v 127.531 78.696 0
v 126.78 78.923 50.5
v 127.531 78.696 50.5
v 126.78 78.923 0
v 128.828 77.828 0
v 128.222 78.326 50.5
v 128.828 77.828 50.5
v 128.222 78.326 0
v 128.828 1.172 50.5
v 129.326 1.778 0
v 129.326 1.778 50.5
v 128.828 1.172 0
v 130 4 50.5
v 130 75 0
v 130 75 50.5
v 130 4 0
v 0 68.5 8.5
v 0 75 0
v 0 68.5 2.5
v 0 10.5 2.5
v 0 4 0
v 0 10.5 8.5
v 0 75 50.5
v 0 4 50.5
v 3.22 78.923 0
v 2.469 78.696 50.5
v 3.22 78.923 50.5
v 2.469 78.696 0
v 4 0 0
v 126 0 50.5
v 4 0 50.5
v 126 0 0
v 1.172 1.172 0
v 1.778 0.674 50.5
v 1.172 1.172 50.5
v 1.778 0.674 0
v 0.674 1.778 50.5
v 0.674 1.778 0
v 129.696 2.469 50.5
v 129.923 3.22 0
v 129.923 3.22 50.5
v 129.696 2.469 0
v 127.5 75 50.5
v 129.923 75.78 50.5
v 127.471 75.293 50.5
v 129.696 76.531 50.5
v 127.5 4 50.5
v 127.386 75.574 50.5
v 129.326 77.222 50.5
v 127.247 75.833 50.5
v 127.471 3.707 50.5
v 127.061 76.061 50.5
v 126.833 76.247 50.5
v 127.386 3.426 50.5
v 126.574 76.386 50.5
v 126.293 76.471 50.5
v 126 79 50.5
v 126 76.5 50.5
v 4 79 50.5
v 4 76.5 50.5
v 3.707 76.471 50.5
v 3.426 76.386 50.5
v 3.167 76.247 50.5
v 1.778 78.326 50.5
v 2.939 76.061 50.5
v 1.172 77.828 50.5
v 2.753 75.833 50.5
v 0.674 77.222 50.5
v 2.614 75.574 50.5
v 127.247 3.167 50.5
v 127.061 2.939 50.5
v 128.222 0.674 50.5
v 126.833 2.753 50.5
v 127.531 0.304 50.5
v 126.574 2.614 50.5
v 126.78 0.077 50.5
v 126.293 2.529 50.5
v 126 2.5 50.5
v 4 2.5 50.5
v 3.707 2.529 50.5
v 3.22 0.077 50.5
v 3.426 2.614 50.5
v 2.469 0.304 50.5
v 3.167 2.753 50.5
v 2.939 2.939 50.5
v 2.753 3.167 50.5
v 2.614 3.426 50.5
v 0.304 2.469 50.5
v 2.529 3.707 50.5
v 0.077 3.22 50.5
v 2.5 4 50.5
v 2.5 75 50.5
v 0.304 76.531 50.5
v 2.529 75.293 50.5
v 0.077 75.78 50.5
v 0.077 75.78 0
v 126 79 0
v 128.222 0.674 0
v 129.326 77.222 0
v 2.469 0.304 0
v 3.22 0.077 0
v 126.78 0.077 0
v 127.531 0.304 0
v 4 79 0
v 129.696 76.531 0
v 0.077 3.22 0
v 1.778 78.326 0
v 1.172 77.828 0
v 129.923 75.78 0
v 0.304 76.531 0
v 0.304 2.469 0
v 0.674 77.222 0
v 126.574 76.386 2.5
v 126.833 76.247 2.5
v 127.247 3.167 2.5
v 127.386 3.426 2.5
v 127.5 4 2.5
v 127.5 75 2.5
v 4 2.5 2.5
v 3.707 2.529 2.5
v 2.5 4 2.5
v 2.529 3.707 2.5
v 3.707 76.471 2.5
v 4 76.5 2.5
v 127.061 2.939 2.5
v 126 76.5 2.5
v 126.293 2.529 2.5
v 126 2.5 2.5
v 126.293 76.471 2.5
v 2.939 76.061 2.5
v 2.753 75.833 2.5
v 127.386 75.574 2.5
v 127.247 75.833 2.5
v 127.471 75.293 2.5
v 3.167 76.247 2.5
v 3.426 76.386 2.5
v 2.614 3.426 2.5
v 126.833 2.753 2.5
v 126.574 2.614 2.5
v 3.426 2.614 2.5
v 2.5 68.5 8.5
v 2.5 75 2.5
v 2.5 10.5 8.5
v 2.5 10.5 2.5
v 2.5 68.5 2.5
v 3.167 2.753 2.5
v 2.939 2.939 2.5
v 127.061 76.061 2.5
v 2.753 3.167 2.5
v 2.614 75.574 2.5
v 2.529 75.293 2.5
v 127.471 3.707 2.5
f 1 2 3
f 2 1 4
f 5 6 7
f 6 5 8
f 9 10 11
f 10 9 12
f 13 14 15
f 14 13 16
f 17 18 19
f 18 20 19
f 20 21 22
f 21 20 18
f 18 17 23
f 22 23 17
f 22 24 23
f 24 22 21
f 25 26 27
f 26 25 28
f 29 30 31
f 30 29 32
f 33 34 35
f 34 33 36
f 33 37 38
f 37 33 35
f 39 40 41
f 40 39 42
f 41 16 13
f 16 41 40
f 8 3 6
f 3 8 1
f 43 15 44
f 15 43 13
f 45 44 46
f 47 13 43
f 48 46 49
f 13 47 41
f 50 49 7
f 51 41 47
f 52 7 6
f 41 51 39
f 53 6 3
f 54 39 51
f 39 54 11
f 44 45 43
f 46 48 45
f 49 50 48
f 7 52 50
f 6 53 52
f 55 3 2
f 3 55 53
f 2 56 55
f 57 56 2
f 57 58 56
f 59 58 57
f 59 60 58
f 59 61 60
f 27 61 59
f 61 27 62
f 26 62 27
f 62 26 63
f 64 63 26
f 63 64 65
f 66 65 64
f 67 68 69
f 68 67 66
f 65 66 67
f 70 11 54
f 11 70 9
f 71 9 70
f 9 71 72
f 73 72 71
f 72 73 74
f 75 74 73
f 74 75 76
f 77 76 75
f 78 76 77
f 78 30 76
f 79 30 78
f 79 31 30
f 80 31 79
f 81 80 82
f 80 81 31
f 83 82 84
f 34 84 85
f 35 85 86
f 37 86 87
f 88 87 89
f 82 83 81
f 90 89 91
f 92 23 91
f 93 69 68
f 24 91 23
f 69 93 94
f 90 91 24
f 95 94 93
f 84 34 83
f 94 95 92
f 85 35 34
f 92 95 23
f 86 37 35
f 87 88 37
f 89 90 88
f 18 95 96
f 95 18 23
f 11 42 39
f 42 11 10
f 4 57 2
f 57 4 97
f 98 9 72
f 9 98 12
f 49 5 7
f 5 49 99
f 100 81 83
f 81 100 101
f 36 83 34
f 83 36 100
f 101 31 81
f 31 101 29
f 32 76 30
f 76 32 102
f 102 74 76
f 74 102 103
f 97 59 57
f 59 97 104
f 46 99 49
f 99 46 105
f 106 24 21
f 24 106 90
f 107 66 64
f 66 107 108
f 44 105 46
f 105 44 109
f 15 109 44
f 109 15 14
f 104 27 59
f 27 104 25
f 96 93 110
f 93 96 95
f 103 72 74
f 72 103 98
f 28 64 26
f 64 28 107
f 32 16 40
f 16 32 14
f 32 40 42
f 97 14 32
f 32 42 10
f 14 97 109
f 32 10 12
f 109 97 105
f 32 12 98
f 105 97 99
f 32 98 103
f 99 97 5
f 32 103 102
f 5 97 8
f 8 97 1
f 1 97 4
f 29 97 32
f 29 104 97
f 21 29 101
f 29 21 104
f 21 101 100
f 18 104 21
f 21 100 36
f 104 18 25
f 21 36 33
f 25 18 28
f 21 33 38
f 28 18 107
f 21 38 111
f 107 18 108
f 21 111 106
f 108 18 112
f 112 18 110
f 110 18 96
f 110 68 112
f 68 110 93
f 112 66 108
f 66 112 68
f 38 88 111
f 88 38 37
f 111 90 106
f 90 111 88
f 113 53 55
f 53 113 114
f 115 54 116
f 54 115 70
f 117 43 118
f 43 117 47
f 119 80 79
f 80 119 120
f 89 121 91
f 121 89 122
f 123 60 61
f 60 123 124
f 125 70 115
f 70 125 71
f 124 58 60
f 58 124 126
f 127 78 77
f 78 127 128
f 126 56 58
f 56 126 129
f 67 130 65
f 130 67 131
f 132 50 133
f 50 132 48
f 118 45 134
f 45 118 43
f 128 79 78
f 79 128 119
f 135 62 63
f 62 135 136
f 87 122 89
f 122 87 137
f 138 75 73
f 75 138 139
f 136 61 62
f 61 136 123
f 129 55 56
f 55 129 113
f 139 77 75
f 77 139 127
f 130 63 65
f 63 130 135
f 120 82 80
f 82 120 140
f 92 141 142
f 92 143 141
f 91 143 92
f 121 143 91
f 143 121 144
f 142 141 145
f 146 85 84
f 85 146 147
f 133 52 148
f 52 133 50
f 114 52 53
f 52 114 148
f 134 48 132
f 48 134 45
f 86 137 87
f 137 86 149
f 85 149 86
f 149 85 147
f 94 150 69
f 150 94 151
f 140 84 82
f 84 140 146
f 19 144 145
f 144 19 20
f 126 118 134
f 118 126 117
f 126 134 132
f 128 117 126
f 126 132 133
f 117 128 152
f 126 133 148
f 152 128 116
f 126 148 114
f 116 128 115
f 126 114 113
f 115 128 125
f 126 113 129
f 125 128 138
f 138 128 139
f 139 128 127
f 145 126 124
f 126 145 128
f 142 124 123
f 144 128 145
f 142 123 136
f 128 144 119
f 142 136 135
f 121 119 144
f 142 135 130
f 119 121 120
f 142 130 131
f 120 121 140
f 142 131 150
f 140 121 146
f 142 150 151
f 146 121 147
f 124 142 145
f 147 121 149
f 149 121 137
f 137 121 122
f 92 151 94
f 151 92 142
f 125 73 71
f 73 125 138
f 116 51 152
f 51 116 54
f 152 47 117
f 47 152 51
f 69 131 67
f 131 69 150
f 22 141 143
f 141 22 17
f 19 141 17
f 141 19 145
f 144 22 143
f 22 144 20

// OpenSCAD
// ============================================================
// SKPOP card dispenser — resized for 120 x 70 mm cards
// + Arduino Uno R3 / YM2758 servo electronics bay
// ============================================================
// All dimensions in mm. Set PART below (via -D PART="...") to
// render just one part per STL export.

// ---------- Card + clearance ----------
card_h        = 120;   // card "height" -> tray length direction
card_w        = 70;    // card "width"  -> tray width direction
card_clear_l  = 5;     // extra length clearance
card_clear_w  = 4;     // extra width clearance
stack_depth   = 48;    // capacity for stacked cards (unchanged from original)

tray_wall     = 2.5;
tray_L        = card_h + card_clear_l;      // 125
tray_W        = card_w + card_clear_w;      // 74
tray_H        = stack_depth;                // 48

tray_outer_L  = tray_L + 2*tray_wall;
tray_outer_W  = tray_W + 2*tray_wall;
tray_outer_H  = tray_H + tray_wall;         // closed bottom, open top

dispense_slot_h = 6;     // height of feed slot at front-bottom of tray
dispense_slot_w = tray_W - 16;

// ---------- Mechanism bay (case) ----------
case_wall      = 3;
mech_clear     = 3;                 // clearance around tray so it can drop in/slide
mech_headroom  = 56;                // space above tray for roller/gear/knob/servo drive
mech_in_L      = tray_outer_L + 2*mech_clear;
mech_in_W      = tray_outer_W + 2*mech_clear;
mech_in_H      = tray_outer_H + mech_headroom;

// Height (from case floor) of the drive shaft that the gear train/knob
// turns on. MEASURE THIS on your actual assembled mechanism and update it —
// it is not something the STL bounding boxes could tell us.
shaft_height   = mech_in_H - 20;     // placeholder guess, adjust before printing
shaft_dia      = 6;                  // clearance hole for coupler shaft

// Front dispensing slot cut through the case front wall, aligned with tray's
front_slot_h   = dispense_slot_h + 2;   // a little extra clearance
front_slot_w   = dispense_slot_w;

// ---------- Arduino Uno R3 ----------
uno_L = 68.6;
uno_W = 53.4;
uno_clear = 6;
uno_bay_L = uno_L + 2*uno_clear;   // ~80.6
uno_bay_W = uno_W + 2*uno_clear;   // ~65.4
uno_bay_H = 25;                    // clearance for USB/DC jack + header pins + wires
uno_standoff_d = 6;
uno_standoff_h = 6;                // lifts board off floor for pins/solder joints
uno_hole_d = 3.2;
// Official Arduino Uno R3 mounting hole coordinates (mm from board corner)
uno_holes = [ [15.24, 2.54], [15.24, 50.80], [66.04, 17.78], [66.04, 45.72] ];

// ---------- YM2758 (SG90-class) servo ----------
servo_body_L = 23;      // along output-shaft axis
servo_body_W = 12.4;
servo_body_H = 29.5;
servo_tab_span = 32.6;  // outer edge to outer edge across mounting tabs
servo_tab_hole_d = 2.2;
servo_pocket_clear = 1.0; // snug friction fit

case_wall2 = 3;

// ============================================================
module rounded_box(l, w, h, r, shell=false, wall=0, open_top=false){
    // basic rounded-rect prism; if shell, hollow it out leaving `wall` thickness
    module solid(ll, ww, hh, rr){
        hull(){
            for(x=[rr, ll-rr]) for(y=[rr, ww-rr])
                translate([x,y,0]) cylinder(h=hh, r=rr, $fn=32);
        }
    }
    if(!shell){
        solid(l,w,h,r);
    } else {
        difference(){
            solid(l,w,h,r);
            translate([wall,wall, open_top ? wall : -1])
                solid(l-2*wall, w-2*wall, open_top ? h : h-2*wall, max(r-wall,0.1));
        }
    }
}

// ---------- 1) CARD TRAY ----------
module card_tray(){
    difference(){
        rounded_box(tray_outer_L, tray_outer_W, tray_outer_H, 4,
                    shell=true, wall=tray_wall, open_top=true);
        // dispensing slot at front-bottom (front = x near 0)
        translate([-1, (tray_outer_W-dispense_slot_w)/2, tray_wall])
            cube([tray_wall+2, dispense_slot_w, dispense_slot_h]);
    }
}

// ---------- 2) MAIN CASE (mechanism bay) ----------
module main_case(){
    outer_L = mech_in_L + 2*case_wall;
    outer_W = mech_in_W + 2*case_wall;
    outer_H = mech_in_H + case_wall; // closed bottom, open top for lid

    difference(){
        rounded_box(outer_L, outer_W, outer_H, 5,
                    shell=true, wall=case_wall, open_top=true);

        // front dispensing slot through case front wall, matching tray slot height
        translate([-1, (outer_W-front_slot_w)/2, case_wall + tray_wall])
            cube([case_wall+2, front_slot_w, front_slot_h]);

        // rear cutout to bolt the electronics bay on + pass the drive shaft through
        translate([outer_L-case_wall-1, outer_W/2-15, shaft_height-15])
            rotate([0,90,0])
            cylinder(h=case_wall+2, d=shaft_dia, $fn=24);
    }

    // tray guide rails on the floor
    for(side=[case_wall+1, outer_W-case_wall-1-2])
        translate([case_wall, side, case_wall])
            cube([mech_in_L-2, 2, 4]);
}

// ---------- 3) ELECTRONICS BAY (Arduino + servo, bolts to rear of case) ----------
module electronics_bay(){
    outer_L = uno_bay_L + servo_body_W + 3*case_wall2; // uno bay + servo pocket side-by-side
    outer_W = max(uno_bay_W, servo_tab_span+4) + 2*case_wall2;
    outer_H = uno_bay_H + case_wall2;

    difference(){
        rounded_box(outer_L, outer_W, outer_H, 4,
                    shell=true, wall=case_wall2, open_top=true);

        // USB + barrel jack access slot on the outer short wall (x=0 side)
        translate([-1, outer_W/2-16, case_wall2+2])
            cube([case_wall2+2, 32, 14]);

        // shaft pass-through aligned with main_case's hole (mate the two parts here)
        translate([-1, outer_W/2, shaft_height-15-case_wall2])
            rotate([0,90,0])
            cylinder(h=case_wall2+2, d=shaft_dia, $fn=24);
    }

    // Arduino Uno standoffs
    translate([case_wall2+uno_clear, case_wall2+uno_clear, case_wall2])
        for(p = uno_holes)
            translate([p[0], p[1], 0])
                difference(){
                    cylinder(h=uno_standoff_h, d=uno_standoff_d, $fn=24);
                    cylinder(h=uno_standoff_h+1, d=uno_hole_d, $fn=16);
                }

    // Servo pocket (friction-fit slot) alongside the Uno bay
    servo_x = uno_bay_L + 2*case_wall2;
    translate([servo_x, (outer_W-servo_body_W)/2, case_wall2])
        difference(){
            cube([servo_body_L+servo_pocket_clear, servo_body_W+servo_pocket_clear, servo_body_H]);
            translate([-1,-1,-1]) cube([1,1,1]); // no-op placeholder to keep diff non-trivial
        }
    // tab screw holes for the servo (through the pocket floor)
    translate([servo_x+servo_body_L/2, (outer_W)/2, 0])
        for(dx=[-servo_tab_span/2, servo_tab_span/2])
            translate([dx,0,0])
                cylinder(h=case_wall2+2, d=servo_tab_hole_d, $fn=16);
}

// ---------- 4) LIDS ----------
module case_lid(){
    outer_L = mech_in_L + 2*case_wall;
    outer_W = mech_in_W + 2*case_wall;
    difference(){
        rounded_box(outer_L, outer_W, 4, 5);
        translate([case_wall+1, case_wall+1, -1])
            rounded_box(outer_L-2*case_wall-2, outer_W-2*case_wall-2, 6, 3);
    }
    // lip that drops into the case opening
    translate([case_wall+1.5, case_wall+1.5, -6])
        rounded_box(outer_L-2*case_wall-3, outer_W-2*case_wall-3, 6, 3);
}

module electronics_lid(){
    outer_L = uno_bay_L + servo_body_W + 3*case_wall2;
    outer_W = max(uno_bay_W, servo_tab_span+4) + 2*case_wall2;
    rounded_box(outer_L, outer_W, 3, 4);
}

// ============================================================
PART = "card_tray"; // overridden via -D PART="..." on the command line

if(PART=="card_tray") card_tray();
else if(PART=="main_case") main_case();
else if(PART=="electronics_bay") electronics_bay();
else if(PART=="case_lid") case_lid();
else if(PART=="electronics_lid") electronics_lid();
